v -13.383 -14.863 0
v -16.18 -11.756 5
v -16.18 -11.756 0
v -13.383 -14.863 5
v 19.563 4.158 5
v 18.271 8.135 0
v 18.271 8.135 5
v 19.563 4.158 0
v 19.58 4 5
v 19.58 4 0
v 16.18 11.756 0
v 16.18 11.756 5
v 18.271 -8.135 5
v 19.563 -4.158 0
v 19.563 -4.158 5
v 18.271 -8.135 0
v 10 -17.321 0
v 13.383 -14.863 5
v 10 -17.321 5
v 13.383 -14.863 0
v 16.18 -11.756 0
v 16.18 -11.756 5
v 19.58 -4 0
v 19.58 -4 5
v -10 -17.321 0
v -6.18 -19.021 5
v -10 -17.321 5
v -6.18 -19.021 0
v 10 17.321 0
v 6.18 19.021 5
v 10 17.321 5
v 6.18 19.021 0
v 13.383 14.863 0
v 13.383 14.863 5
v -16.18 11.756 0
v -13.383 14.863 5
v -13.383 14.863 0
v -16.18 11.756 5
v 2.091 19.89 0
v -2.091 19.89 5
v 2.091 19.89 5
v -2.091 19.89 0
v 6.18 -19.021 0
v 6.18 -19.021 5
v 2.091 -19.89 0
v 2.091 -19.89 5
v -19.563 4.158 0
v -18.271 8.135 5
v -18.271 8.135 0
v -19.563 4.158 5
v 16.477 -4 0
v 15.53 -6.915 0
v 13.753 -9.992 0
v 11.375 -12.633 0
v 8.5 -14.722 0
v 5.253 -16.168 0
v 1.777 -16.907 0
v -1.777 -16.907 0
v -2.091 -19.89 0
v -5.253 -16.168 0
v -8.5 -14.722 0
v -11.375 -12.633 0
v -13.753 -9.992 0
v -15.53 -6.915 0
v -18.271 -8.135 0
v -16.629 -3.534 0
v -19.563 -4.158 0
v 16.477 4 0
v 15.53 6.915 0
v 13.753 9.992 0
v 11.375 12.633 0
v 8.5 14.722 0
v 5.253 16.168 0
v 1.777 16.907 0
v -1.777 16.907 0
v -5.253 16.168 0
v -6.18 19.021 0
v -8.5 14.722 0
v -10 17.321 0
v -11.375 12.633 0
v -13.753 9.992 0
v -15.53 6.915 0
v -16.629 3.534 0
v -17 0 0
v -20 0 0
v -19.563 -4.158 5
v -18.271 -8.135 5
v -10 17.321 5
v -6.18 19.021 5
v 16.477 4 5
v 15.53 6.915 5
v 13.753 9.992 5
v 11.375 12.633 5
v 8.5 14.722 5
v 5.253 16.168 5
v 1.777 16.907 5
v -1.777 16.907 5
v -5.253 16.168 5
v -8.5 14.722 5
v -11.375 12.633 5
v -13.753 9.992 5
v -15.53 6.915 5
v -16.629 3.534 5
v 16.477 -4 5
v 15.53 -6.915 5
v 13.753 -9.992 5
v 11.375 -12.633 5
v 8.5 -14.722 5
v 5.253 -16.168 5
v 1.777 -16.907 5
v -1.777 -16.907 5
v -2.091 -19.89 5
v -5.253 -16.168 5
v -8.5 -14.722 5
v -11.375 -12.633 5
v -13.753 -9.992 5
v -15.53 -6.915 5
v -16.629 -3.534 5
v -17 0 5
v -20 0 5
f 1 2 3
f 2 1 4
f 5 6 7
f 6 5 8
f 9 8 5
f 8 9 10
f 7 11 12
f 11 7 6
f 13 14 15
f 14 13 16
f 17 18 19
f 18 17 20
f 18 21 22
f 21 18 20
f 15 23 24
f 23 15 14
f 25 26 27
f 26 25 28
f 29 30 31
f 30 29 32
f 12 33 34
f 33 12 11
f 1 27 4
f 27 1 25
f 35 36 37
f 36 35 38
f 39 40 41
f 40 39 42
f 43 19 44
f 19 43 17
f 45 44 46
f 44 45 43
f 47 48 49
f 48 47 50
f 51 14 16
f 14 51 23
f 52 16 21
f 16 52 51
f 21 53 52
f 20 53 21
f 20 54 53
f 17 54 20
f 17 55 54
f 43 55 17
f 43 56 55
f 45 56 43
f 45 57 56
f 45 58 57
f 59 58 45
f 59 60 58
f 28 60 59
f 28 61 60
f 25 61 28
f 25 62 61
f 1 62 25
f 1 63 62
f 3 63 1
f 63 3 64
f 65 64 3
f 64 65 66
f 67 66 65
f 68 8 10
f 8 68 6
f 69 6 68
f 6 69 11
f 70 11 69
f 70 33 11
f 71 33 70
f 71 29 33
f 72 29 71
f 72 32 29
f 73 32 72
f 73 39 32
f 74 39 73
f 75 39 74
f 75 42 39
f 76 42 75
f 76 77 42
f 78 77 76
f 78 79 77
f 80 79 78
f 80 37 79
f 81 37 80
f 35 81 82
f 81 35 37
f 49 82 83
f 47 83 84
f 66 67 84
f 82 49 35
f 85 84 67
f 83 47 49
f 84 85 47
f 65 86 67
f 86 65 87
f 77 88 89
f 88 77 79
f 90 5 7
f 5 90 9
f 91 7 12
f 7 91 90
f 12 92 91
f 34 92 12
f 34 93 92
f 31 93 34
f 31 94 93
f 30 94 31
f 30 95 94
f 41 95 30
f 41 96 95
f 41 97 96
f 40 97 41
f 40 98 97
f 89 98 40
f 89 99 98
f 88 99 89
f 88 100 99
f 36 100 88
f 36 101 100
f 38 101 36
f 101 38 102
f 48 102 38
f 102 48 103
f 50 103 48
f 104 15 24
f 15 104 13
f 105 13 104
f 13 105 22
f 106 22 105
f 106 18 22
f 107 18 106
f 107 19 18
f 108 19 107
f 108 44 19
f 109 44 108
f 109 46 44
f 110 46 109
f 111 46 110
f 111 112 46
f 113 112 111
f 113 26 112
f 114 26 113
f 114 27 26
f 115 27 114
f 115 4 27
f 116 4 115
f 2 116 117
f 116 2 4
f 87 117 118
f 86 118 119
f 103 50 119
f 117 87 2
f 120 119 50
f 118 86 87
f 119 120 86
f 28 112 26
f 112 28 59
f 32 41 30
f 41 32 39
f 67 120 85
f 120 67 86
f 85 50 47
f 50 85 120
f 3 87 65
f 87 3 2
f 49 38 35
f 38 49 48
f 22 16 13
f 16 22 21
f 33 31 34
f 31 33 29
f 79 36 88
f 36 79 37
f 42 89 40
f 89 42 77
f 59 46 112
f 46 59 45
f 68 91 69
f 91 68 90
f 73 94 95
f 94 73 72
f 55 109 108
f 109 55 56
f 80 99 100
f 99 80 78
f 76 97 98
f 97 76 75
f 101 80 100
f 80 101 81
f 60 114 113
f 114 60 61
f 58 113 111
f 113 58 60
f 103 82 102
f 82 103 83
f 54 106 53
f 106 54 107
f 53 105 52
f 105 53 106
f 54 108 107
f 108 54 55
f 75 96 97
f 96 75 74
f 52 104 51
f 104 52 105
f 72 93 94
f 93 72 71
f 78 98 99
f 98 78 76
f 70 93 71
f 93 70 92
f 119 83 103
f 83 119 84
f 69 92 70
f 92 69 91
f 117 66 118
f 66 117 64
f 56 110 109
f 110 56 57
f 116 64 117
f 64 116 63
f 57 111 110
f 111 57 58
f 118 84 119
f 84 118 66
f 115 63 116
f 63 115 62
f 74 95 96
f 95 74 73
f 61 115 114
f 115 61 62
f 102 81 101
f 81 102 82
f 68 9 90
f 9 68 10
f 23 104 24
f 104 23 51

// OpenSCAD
difference() {
	cylinder(r=20, h=5);
	translate([0, 0, -1]) {
		cylinder(r=17, h=7);
	}
	translate([0, -4, -1]) {
		cube([30, 8, 7]);
	}
}
